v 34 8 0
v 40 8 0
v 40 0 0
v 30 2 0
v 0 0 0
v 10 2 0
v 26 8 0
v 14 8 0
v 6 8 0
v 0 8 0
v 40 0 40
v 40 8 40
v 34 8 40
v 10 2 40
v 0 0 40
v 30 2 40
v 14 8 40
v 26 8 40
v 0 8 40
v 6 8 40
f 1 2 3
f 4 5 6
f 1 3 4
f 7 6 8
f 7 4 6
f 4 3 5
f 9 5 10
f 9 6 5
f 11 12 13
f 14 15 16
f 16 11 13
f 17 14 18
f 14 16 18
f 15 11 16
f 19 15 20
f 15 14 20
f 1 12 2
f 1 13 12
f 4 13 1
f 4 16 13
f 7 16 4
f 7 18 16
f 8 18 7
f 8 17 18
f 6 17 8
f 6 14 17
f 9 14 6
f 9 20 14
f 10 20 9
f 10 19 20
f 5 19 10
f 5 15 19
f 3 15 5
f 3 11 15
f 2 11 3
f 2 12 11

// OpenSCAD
$fn = 32;

// ----------------------------------------------------------------------
// V guide rail: doublev, 40 mm wide
// ----------------------------------------------------------------------

// --- parameters (mm) ---
rail_w = 40;              // rail width, X
base_t = 8;               // base plate thickness
v_depth = 6;              // V feature depth / height
v_half_w = 8;             // half width of the V at the base face
plate_t = 40;             // rail length, Z (the extrusion height)
groove_off = 10;          // offset of each groove from the centreline

centre_x = rail_w / 2;  // rail centreline
groove_a = centre_x - groove_off;  // axis of the first groove
groove_b = centre_x + groove_off;  // axis of the second groove

profile = [[0, 0], [40, 0], [40, 8], [34, 8], [30, 2], [26, 8], [14, 8], [10, 2], [6, 8], [0, 8]];  // primary outline, 10 points, counter clockwise

// --- the one profile operation ---
linear_extrude(height = plate_t) polygon(points = profile);
